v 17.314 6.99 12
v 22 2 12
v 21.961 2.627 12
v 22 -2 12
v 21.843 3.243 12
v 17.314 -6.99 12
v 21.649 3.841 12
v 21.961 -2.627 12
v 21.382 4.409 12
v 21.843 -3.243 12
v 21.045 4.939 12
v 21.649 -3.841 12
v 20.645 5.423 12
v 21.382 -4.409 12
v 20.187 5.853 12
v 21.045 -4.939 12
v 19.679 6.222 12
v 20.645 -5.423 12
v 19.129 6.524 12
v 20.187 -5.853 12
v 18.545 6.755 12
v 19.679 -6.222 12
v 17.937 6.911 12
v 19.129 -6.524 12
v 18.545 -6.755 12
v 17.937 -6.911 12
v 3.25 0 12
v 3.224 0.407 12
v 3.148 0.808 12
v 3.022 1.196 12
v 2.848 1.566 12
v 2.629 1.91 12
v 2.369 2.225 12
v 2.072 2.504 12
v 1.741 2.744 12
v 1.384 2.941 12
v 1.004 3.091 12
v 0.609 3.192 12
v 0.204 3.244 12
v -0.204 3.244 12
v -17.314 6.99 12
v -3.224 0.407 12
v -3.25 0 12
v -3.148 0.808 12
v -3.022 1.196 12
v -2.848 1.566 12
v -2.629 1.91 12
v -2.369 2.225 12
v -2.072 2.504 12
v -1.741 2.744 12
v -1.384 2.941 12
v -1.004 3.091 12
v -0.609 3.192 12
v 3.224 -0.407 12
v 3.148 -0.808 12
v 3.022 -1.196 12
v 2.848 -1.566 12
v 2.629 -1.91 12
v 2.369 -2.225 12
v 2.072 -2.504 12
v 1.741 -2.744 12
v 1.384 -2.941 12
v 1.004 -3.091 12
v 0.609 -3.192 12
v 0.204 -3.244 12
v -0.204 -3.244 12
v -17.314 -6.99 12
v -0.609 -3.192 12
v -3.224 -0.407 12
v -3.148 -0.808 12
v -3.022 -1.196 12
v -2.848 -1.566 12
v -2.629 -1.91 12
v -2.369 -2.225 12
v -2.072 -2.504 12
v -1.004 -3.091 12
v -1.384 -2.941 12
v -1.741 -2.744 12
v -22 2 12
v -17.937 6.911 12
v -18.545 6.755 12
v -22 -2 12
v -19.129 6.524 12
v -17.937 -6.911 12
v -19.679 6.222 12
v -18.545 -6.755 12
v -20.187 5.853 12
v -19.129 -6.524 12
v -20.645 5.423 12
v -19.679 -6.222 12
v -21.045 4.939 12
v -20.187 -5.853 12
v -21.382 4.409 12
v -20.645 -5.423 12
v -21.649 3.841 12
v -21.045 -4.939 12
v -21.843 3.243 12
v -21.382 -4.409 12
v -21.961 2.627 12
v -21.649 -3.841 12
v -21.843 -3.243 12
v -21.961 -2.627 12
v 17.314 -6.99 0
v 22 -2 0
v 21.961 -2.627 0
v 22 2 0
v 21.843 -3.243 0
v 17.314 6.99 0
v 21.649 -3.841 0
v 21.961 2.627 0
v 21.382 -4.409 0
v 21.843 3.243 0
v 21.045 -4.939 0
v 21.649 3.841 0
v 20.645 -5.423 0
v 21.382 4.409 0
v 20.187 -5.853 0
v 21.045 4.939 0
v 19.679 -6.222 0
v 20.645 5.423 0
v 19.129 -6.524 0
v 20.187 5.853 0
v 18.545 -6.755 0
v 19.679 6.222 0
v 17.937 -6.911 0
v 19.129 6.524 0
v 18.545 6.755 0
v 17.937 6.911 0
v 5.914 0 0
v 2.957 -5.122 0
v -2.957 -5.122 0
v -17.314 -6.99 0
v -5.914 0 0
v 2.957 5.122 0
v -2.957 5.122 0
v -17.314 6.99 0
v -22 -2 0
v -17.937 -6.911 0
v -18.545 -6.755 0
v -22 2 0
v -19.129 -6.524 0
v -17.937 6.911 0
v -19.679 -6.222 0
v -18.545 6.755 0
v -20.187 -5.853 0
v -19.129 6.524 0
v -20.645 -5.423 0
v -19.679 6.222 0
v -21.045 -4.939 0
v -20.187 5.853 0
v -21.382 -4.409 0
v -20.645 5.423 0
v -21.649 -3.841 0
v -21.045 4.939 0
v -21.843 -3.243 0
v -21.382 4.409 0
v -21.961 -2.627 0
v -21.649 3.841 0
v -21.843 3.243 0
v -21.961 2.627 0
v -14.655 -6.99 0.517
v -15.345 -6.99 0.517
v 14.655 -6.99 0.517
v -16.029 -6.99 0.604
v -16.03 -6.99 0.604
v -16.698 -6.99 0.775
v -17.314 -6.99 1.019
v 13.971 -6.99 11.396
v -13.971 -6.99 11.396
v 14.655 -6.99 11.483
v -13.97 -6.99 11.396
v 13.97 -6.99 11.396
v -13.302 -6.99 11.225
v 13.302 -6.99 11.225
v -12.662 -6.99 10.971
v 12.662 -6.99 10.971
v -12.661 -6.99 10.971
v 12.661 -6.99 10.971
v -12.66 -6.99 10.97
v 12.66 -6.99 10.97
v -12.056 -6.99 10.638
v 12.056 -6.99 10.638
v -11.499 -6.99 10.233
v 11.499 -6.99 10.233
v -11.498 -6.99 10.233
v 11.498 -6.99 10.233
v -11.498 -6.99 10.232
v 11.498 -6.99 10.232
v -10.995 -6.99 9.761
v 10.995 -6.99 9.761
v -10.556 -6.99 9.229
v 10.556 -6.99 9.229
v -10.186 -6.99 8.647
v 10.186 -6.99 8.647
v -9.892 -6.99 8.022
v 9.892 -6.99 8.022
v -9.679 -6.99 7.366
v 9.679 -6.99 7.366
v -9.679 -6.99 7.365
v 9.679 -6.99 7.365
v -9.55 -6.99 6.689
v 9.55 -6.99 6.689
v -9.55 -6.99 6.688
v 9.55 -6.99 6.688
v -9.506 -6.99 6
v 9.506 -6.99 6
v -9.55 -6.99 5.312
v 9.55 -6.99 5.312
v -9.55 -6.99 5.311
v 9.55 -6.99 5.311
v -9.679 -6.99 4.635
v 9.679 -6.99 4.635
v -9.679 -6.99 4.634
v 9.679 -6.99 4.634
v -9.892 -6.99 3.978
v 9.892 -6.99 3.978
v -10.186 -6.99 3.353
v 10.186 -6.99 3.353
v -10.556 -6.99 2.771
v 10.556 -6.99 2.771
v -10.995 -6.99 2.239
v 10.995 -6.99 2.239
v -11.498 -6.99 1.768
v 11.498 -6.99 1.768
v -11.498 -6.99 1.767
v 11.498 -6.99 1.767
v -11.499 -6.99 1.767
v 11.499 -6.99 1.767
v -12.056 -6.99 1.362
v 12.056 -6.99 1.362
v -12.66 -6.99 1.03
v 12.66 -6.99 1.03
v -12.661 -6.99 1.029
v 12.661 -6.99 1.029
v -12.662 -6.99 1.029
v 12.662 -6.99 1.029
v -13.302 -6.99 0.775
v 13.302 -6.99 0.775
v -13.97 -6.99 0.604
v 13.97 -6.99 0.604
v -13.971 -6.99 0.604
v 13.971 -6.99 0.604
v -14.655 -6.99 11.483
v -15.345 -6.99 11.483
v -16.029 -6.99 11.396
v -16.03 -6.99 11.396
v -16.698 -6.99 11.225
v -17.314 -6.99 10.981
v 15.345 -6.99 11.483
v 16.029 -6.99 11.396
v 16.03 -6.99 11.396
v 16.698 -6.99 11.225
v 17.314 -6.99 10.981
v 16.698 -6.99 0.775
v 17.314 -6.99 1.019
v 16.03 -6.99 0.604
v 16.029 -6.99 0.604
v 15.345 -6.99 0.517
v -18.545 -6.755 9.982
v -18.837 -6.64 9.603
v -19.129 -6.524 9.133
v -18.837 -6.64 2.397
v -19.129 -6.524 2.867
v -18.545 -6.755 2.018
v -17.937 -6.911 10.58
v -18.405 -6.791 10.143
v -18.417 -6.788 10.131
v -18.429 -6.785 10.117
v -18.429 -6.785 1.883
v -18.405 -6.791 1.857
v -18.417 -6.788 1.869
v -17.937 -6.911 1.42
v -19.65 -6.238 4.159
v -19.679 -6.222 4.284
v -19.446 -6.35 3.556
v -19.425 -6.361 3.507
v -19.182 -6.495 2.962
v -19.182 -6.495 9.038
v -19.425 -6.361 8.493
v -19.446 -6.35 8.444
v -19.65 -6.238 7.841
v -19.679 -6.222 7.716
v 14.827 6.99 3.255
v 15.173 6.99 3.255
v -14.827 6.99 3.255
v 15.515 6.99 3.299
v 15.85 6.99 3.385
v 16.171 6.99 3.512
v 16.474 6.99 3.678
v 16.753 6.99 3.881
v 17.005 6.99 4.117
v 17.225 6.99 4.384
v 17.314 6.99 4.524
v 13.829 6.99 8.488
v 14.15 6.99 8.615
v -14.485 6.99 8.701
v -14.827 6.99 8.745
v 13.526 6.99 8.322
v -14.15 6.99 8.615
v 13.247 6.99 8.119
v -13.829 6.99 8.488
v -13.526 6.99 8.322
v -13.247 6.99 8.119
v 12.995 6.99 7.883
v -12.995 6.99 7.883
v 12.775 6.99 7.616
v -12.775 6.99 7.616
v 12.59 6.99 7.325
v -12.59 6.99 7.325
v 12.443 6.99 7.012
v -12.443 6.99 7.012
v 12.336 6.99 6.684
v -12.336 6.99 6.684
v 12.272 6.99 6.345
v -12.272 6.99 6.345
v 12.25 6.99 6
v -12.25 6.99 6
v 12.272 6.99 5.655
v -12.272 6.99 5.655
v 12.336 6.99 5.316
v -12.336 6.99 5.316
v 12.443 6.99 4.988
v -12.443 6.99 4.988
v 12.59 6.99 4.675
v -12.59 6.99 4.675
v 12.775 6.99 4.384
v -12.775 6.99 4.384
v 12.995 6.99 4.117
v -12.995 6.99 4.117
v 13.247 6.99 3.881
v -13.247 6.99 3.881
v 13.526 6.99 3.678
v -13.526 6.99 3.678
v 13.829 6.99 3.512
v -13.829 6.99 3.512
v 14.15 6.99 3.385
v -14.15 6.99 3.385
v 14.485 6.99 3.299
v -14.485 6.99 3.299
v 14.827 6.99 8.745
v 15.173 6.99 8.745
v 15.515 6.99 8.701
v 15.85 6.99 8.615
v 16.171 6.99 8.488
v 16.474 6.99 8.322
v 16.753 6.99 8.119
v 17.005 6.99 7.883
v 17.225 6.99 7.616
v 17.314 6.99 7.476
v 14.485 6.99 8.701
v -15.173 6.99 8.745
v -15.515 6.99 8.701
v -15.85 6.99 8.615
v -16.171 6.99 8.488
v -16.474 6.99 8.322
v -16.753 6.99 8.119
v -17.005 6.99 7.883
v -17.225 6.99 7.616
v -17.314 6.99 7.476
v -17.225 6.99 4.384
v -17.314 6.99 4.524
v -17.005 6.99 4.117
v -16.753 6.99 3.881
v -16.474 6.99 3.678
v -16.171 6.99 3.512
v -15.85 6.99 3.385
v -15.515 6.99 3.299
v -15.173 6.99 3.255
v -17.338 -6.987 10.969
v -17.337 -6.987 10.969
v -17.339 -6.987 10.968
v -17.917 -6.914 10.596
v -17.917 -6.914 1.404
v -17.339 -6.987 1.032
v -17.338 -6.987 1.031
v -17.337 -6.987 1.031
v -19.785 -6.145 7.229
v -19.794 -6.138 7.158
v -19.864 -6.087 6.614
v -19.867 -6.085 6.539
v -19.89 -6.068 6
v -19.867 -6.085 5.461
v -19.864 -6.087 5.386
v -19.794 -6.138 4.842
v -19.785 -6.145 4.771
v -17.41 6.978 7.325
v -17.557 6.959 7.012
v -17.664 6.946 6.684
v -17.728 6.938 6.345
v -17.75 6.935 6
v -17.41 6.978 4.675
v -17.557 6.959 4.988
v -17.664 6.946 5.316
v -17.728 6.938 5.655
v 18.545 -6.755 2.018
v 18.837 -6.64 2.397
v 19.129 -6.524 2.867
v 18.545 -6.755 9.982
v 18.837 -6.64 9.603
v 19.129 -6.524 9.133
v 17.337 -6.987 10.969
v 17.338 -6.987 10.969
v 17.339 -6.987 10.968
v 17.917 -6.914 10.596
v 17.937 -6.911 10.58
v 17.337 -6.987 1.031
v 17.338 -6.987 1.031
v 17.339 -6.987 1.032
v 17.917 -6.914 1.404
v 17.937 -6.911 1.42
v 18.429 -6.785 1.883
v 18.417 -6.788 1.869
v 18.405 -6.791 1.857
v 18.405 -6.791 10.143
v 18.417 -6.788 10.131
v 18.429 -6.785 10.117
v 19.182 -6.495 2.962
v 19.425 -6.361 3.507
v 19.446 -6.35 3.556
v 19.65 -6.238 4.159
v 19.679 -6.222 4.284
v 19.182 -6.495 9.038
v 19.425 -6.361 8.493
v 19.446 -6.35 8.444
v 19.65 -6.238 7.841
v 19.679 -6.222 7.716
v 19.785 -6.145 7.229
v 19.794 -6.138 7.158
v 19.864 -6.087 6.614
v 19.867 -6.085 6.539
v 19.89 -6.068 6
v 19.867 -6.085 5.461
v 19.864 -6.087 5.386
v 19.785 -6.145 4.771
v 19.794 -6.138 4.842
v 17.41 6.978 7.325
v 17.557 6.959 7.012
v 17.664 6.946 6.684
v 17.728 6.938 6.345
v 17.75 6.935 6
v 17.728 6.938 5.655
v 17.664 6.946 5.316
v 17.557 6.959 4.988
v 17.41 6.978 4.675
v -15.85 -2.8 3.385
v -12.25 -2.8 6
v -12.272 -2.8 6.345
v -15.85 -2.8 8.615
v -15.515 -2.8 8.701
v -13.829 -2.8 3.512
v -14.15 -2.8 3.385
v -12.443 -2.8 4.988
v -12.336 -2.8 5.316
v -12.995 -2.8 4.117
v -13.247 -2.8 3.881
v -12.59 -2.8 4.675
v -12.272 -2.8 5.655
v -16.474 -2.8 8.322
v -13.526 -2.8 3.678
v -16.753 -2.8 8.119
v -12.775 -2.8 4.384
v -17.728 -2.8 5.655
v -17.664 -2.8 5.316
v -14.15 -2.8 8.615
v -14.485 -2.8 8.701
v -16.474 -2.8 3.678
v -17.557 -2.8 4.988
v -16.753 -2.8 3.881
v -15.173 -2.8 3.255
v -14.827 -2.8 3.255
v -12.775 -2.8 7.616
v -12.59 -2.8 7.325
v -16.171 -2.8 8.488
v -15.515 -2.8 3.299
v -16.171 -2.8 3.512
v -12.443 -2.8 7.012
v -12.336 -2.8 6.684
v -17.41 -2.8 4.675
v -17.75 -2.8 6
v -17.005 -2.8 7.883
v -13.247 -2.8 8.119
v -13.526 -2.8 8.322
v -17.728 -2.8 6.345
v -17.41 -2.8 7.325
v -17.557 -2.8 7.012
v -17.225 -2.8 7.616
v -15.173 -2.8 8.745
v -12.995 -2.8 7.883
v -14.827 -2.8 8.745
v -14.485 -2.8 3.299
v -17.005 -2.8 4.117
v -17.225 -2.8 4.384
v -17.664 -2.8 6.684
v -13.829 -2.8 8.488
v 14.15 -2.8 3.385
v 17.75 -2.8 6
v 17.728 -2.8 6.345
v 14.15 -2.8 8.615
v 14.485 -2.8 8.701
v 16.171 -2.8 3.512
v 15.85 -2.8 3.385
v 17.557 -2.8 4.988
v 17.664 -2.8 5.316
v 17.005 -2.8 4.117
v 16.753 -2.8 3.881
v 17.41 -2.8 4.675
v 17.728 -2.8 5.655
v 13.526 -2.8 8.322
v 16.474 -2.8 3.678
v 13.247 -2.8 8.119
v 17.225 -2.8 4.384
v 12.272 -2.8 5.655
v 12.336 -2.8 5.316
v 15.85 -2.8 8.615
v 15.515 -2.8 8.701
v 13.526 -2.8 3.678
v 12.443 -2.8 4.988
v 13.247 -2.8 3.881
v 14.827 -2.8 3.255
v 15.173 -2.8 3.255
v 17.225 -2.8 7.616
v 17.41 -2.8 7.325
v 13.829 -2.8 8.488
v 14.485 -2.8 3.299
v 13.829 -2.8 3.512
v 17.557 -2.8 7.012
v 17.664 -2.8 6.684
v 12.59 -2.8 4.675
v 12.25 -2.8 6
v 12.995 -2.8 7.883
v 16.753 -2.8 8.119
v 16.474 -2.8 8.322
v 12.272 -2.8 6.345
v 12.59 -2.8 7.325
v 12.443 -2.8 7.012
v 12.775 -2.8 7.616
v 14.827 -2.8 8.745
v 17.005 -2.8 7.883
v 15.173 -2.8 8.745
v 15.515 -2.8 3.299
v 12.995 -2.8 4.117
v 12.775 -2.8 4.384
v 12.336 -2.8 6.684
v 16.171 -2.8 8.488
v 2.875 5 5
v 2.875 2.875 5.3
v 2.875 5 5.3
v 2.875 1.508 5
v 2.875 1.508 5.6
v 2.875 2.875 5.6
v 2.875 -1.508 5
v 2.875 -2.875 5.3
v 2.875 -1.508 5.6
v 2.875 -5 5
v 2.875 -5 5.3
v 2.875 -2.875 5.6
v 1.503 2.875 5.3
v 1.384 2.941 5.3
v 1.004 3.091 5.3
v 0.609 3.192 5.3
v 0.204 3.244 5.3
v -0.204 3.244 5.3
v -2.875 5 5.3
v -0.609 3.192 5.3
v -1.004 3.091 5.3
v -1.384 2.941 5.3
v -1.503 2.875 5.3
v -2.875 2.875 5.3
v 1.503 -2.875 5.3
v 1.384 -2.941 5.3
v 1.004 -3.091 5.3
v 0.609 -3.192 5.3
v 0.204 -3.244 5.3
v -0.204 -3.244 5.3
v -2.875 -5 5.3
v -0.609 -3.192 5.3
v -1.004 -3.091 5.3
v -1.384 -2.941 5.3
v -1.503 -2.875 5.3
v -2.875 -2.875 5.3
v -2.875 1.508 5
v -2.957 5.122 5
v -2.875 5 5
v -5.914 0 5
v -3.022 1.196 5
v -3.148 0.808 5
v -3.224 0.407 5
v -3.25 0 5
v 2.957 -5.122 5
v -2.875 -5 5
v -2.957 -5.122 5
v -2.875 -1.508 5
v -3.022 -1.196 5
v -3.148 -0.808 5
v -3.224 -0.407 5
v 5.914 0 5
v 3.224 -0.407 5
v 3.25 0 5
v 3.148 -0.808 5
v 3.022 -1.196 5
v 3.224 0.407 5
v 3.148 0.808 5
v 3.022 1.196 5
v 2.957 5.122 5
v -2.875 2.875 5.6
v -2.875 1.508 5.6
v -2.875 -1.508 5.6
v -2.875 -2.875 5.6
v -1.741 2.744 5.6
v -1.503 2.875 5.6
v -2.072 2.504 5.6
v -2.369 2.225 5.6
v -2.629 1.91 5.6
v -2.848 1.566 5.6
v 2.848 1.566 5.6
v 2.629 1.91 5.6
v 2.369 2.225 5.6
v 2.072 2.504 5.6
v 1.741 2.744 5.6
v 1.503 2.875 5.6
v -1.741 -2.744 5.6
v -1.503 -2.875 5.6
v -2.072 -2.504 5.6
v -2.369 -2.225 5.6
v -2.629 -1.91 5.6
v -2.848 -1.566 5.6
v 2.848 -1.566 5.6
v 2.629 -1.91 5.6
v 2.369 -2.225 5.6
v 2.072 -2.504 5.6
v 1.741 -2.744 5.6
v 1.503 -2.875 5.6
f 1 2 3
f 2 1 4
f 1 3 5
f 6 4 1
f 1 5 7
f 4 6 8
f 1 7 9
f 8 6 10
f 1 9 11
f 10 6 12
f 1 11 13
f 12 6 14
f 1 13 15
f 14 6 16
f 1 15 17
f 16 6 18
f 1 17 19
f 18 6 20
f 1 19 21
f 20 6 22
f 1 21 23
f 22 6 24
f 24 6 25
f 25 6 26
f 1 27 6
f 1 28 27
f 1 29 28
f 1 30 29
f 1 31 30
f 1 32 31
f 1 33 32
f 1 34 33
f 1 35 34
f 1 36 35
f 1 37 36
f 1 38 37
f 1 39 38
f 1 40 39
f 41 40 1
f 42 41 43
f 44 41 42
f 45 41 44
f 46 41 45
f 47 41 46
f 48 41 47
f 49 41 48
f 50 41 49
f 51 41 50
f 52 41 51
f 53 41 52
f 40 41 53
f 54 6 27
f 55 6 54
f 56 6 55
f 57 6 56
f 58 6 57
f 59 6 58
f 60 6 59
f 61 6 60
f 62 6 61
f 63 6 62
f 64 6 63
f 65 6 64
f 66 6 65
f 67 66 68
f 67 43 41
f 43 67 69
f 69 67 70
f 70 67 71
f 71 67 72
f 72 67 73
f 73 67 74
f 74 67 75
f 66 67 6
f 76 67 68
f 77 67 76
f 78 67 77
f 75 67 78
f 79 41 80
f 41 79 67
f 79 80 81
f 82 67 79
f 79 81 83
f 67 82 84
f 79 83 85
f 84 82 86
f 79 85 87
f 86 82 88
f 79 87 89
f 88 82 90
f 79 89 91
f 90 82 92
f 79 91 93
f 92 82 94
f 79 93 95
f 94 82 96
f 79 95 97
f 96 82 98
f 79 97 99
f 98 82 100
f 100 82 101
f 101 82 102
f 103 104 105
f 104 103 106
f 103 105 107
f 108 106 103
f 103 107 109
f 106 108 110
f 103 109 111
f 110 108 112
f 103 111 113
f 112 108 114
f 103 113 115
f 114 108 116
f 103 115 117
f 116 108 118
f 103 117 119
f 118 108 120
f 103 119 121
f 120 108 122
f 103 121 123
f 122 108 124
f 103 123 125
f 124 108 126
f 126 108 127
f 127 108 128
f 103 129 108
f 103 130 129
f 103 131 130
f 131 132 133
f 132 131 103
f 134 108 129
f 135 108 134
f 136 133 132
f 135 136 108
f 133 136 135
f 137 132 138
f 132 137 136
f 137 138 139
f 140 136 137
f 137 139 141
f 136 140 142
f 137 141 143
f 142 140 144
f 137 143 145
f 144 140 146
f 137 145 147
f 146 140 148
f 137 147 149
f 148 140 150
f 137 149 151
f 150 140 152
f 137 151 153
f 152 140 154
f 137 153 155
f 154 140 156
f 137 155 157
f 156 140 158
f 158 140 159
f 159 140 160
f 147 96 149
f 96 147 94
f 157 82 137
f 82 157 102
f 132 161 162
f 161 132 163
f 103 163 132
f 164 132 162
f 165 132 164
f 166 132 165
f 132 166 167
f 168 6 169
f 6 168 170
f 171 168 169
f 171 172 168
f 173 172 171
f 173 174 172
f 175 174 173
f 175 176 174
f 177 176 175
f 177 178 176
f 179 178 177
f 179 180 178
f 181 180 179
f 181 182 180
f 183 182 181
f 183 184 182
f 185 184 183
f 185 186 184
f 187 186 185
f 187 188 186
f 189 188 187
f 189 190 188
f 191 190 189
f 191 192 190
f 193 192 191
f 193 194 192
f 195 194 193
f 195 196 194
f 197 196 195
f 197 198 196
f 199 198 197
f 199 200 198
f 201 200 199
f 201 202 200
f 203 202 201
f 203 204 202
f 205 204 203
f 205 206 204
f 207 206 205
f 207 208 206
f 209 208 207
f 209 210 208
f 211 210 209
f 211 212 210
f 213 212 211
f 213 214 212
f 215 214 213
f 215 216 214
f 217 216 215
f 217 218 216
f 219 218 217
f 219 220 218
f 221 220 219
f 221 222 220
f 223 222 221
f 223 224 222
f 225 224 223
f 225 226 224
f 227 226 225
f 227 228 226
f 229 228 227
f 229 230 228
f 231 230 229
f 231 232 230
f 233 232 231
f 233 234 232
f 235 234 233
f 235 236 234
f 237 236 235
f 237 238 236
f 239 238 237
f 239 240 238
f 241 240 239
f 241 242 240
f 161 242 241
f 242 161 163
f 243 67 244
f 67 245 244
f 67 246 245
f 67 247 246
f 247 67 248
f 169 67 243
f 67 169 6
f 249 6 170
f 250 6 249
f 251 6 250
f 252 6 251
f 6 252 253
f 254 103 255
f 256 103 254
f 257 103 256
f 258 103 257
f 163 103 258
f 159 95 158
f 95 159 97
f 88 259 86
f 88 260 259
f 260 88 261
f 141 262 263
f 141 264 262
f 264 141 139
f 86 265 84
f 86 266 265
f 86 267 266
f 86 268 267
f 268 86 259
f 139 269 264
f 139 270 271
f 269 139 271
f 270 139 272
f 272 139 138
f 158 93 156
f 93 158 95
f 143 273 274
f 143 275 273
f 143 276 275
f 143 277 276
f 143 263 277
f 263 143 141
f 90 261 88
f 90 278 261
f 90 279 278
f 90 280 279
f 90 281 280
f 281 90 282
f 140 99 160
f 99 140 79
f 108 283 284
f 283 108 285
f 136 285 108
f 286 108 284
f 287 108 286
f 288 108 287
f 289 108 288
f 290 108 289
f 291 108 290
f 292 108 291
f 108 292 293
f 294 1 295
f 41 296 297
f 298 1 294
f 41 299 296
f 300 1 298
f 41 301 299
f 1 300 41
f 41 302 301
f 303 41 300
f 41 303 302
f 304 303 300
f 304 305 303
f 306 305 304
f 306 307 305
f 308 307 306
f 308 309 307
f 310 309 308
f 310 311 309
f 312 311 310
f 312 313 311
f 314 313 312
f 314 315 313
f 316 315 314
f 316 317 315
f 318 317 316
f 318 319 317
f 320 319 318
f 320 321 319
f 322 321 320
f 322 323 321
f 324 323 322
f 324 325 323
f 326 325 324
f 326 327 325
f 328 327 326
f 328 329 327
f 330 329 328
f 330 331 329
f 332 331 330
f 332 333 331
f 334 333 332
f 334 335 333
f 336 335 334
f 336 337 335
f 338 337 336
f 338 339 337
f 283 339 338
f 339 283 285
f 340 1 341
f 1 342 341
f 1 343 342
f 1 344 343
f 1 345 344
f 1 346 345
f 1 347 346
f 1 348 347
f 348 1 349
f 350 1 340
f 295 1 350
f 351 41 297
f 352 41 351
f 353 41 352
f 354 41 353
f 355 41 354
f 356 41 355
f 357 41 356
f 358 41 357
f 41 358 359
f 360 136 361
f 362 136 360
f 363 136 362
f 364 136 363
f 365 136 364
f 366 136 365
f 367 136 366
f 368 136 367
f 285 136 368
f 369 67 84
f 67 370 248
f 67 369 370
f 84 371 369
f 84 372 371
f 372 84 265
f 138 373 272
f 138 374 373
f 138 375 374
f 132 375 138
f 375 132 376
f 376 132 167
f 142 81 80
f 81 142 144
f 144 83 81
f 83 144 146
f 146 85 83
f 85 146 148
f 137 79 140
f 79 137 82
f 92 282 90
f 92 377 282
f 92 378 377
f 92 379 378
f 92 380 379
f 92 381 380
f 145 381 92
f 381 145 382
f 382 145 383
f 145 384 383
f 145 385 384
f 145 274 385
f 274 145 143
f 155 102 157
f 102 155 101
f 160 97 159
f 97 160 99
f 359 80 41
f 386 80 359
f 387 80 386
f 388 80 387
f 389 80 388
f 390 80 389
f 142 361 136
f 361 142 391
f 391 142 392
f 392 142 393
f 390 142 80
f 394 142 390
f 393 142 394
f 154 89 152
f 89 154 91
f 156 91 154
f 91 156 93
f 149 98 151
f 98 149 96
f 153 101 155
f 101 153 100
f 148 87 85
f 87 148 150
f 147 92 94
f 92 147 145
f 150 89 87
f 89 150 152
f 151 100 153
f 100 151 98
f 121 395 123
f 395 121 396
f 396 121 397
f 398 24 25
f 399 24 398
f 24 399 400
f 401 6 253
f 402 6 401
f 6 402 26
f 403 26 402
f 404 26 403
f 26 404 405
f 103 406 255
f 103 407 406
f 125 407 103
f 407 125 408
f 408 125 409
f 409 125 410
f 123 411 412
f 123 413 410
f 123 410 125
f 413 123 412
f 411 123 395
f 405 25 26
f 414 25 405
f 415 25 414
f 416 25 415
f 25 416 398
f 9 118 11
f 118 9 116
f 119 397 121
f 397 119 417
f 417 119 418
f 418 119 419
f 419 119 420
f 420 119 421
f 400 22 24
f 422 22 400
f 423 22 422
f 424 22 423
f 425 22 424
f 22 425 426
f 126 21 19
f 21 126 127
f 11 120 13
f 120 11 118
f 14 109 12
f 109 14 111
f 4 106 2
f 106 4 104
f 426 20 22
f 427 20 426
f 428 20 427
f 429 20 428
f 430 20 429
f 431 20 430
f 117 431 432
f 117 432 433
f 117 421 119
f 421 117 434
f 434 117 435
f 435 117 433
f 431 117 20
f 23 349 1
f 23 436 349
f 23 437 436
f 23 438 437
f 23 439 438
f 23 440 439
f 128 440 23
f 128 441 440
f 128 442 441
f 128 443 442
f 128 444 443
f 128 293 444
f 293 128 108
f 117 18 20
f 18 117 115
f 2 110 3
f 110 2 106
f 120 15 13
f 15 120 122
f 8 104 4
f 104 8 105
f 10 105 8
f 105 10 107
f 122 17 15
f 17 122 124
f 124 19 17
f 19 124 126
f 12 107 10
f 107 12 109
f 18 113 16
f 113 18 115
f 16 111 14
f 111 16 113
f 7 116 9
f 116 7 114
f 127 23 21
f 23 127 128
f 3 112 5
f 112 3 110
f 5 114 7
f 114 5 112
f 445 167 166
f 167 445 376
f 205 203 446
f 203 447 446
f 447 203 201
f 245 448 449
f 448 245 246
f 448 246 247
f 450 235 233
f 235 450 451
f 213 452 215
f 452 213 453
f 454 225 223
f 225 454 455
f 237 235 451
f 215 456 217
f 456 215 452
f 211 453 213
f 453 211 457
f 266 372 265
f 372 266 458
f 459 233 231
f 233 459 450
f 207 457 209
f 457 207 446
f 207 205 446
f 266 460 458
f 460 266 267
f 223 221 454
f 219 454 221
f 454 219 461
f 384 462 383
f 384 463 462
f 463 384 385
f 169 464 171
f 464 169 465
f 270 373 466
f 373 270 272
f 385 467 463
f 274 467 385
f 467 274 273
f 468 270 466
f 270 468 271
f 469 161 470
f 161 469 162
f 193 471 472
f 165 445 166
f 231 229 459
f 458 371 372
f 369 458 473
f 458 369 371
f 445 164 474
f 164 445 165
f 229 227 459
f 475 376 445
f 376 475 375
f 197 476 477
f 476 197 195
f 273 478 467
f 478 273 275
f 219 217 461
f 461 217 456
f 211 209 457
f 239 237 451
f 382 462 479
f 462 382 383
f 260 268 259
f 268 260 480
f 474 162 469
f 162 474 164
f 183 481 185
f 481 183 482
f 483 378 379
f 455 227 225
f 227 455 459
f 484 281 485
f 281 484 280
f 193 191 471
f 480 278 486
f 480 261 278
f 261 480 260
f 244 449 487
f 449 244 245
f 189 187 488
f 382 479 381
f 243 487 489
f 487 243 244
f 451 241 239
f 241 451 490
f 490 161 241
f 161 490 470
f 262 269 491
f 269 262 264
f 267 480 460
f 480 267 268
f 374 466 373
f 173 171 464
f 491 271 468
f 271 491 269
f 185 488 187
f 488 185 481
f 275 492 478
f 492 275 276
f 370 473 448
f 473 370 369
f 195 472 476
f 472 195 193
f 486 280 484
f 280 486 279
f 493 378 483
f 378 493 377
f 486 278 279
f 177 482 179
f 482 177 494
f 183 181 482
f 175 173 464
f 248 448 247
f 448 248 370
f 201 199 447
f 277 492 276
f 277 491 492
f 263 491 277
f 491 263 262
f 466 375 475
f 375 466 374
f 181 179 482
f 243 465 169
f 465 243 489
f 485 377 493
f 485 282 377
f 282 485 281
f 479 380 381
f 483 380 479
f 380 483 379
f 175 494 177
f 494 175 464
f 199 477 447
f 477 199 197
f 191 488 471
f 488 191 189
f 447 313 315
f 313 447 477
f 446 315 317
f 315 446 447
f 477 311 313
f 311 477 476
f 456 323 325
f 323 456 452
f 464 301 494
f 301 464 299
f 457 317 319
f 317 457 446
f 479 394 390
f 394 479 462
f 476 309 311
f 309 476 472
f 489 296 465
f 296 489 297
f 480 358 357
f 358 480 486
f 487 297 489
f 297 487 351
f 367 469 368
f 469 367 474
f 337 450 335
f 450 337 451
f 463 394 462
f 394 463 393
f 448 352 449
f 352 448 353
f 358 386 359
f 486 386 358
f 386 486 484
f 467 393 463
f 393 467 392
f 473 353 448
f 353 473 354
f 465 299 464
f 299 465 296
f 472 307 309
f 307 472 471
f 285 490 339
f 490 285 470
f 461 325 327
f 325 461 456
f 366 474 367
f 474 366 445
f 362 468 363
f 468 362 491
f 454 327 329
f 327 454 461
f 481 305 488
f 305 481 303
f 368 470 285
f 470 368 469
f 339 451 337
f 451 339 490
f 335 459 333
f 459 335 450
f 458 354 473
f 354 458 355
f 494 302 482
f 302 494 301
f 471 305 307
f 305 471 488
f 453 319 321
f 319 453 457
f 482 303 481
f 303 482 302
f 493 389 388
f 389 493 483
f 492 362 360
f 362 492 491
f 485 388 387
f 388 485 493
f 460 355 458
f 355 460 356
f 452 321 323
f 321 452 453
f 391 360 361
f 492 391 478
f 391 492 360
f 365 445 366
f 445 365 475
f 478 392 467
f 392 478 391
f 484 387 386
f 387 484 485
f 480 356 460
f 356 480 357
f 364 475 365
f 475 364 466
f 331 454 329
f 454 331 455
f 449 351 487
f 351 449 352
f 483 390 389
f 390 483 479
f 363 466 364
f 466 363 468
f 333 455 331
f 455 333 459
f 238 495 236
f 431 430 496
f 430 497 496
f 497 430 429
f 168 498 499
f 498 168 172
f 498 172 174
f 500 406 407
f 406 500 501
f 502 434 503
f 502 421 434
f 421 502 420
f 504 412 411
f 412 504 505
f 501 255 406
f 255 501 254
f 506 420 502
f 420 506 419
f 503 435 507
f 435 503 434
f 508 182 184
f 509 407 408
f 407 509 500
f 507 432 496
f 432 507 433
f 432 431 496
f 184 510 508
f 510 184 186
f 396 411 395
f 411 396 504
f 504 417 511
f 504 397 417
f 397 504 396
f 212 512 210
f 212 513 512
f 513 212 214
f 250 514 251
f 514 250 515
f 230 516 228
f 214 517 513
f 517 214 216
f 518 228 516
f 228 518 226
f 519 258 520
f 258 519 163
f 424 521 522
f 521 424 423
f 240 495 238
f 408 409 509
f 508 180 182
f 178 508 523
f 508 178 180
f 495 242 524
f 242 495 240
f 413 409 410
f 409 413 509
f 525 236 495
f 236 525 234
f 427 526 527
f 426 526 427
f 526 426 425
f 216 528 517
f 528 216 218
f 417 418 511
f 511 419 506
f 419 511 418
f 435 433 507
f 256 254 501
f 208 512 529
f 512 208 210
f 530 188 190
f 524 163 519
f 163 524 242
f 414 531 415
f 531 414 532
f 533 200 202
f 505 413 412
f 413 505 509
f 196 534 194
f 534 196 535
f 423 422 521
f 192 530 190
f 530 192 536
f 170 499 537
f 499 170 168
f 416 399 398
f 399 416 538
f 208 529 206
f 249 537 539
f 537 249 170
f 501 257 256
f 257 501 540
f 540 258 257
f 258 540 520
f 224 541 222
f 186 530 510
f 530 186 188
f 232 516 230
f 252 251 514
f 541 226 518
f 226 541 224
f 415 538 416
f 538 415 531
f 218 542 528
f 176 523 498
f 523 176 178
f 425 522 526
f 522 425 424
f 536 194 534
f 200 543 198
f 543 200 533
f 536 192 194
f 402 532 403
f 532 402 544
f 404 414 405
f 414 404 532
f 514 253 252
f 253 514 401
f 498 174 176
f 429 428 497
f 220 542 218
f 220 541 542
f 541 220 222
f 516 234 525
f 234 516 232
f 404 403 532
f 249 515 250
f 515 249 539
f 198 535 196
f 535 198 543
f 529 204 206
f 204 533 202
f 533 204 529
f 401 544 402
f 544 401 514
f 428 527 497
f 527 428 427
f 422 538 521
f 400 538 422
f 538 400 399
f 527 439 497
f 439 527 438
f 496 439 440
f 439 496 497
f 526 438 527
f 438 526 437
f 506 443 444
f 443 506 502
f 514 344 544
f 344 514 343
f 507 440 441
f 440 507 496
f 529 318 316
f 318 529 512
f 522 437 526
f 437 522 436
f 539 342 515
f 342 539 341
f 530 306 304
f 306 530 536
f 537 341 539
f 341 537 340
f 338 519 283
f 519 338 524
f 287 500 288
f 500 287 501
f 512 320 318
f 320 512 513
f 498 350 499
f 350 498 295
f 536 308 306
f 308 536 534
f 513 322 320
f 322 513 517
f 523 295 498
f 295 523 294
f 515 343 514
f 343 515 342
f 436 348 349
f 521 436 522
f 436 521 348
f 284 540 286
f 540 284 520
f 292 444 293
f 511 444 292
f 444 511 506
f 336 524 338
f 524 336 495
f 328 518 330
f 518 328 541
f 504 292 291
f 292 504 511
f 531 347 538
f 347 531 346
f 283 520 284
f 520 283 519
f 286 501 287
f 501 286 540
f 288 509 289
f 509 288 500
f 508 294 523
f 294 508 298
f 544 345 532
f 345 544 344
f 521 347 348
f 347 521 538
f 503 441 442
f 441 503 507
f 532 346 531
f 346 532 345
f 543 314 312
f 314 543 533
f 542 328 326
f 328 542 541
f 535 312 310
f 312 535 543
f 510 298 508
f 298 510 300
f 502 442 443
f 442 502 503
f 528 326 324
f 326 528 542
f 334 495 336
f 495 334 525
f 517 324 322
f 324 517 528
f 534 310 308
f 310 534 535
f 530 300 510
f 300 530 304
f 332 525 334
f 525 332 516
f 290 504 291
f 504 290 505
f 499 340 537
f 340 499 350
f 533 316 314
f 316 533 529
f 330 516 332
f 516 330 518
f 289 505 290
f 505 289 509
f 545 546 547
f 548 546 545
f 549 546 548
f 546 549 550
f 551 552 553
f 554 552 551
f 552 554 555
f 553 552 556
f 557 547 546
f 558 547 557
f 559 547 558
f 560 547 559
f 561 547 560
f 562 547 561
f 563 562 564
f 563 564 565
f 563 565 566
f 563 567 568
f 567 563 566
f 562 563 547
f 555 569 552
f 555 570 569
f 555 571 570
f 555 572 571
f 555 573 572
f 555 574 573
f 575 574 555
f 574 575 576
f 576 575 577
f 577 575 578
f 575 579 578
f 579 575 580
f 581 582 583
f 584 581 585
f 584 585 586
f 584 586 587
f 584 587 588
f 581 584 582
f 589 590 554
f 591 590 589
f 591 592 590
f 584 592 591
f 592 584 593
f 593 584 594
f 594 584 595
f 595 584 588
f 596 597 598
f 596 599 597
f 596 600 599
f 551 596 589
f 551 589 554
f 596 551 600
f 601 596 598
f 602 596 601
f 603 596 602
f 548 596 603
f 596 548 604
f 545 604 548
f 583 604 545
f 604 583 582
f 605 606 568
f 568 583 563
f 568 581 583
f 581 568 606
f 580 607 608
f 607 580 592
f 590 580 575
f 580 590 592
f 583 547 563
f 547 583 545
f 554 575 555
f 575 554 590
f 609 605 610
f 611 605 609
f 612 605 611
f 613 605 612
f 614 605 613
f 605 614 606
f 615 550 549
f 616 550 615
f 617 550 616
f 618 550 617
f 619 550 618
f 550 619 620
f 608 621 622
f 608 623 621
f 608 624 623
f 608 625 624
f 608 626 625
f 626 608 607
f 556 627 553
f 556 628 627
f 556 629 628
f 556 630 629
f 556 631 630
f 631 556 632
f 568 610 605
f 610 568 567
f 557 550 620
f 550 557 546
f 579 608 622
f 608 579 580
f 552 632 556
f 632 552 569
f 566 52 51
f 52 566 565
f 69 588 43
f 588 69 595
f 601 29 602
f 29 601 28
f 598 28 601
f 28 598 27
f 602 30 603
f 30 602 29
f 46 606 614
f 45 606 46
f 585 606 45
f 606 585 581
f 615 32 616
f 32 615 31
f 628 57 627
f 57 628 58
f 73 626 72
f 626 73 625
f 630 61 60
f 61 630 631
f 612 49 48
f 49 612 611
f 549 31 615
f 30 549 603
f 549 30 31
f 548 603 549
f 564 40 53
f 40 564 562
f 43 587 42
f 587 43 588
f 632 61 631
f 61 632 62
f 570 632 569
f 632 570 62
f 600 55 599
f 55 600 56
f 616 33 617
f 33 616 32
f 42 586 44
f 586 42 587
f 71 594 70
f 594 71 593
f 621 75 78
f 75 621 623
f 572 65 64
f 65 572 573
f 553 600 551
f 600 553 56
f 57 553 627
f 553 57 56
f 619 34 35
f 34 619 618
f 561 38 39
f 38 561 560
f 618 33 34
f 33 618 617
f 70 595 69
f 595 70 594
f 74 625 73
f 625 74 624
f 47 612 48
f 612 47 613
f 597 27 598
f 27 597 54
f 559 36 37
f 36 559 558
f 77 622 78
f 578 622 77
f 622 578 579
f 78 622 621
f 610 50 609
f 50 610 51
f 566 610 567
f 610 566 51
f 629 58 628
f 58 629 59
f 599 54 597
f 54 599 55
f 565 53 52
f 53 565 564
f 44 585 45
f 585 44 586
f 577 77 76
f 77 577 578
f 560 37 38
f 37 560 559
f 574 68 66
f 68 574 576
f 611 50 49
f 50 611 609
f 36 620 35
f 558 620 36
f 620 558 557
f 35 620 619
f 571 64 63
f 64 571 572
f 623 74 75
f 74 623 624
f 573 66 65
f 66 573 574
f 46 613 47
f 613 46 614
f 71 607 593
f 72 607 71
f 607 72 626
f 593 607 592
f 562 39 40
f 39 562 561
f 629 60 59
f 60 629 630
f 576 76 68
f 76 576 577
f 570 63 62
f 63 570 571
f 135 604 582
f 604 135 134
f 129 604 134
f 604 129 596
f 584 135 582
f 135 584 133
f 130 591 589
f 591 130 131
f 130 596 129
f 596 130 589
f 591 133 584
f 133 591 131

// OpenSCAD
$fn = 50;


difference() {
	union() {
		cylinder(h = 12, r = 7.0000000000);
		translate(v = [-7.5000000000, 0.0000000000, 0]) {
			hull() {
				translate(v = [-9.5000000000, 2.0000000000, 0]) {
					cylinder(h = 12, r = 5);
				}
				translate(v = [9.5000000000, 2.0000000000, 0]) {
					cylinder(h = 12, r = 5);
				}
				translate(v = [-9.5000000000, -2.0000000000, 0]) {
					cylinder(h = 12, r = 5);
				}
				translate(v = [9.5000000000, -2.0000000000, 0]) {
					cylinder(h = 12, r = 5);
				}
			}
		}
		translate(v = [7.5000000000, 0.0000000000, 0]) {
			hull() {
				translate(v = [-9.5000000000, 2.0000000000, 0]) {
					cylinder(h = 12, r = 5);
				}
				translate(v = [9.5000000000, 2.0000000000, 0]) {
					cylinder(h = 12, r = 5);
				}
				translate(v = [-9.5000000000, -2.0000000000, 0]) {
					cylinder(h = 12, r = 5);
				}
				translate(v = [9.5000000000, -2.0000000000, 0]) {
					cylinder(h = 12, r = 5);
				}
			}
		}
	}
	union() {
		translate(v = [-15.0000000000, -7.0000000000, 6.0000000000]) {
			rotate(a = [90, 0, 0]) {
				difference() {
					union() {
						#translate(v = [0, 0, -14.0000000000]) {
							cylinder(h = 14, r = 2.2500000000);
						}
						#translate(v = [0, 0, -4.2000000000]) {
							cylinder(h = 4.2000000000, r1 = 2.7500000000, r2 = 5.5000000000);
						}
						#translate(v = [0, 0, -14.0000000000]) {
							cylinder(h = 14, r = 2.7500000000);
						}
						#translate(v = [0, 0, -14.0000000000]) {
							cylinder(h = 14, r = 2.2500000000);
						}
					}
					union();
				}
			}
		}
		translate(v = [15.0000000000, -7.0000000000, 6.0000000000]) {
			rotate(a = [90, 0, 0]) {
				difference() {
					union() {
						#translate(v = [0, 0, -14.0000000000]) {
							cylinder(h = 14, r = 2.2500000000);
						}
						#translate(v = [0, 0, -4.2000000000]) {
							cylinder(h = 4.2000000000, r1 = 2.7500000000, r2 = 5.5000000000);
						}
						#translate(v = [0, 0, -14.0000000000]) {
							cylinder(h = 14, r = 2.7500000000);
						}
						#translate(v = [0, 0, -14.0000000000]) {
							cylinder(h = 14, r = 2.2500000000);
						}
					}
					union();
				}
			}
		}
		translate(v = [0.0000000000, 0.0000000000, 0]) {
			rotate(a = [0, 0, 0]) {
				difference() {
					union() {
						#translate(v = [-2.8750000000, -5.0000000000, -0.3000000000]) {
							cube(size = [5.7500000000, 10, 0.3000000000]);
						}
						#translate(v = [-2.8750000000, -2.8750000000, -0.6000000000]) {
							cube(size = [5.7500000000, 5.7500000000, 0.3000000000]);
						}
						#translate(v = [-2.8750000000, -5.0000000000, 5]) {
							cube(size = [5.7500000000, 10, 0.3000000000]);
						}
						#translate(v = [-2.8750000000, -2.8750000000, 5.3000000000]) {
							cube(size = [5.7500000000, 5.7500000000, 0.3000000000]);
						}
						#translate(v = [0, 0, -100.0000000000]) {
							cylinder(h = 200, r = 3.2500000000);
						}
						#linear_extrude(height = 5) {
							polygon(points = [[5.9142500000, 0.0000000000], [2.9571250000, 5.1218907443], [-2.9571250000, 5.1218907443], [-5.9142500000, 0.0000000000], [-2.9571250000, -5.1218907443], [2.9571250000, -5.1218907443]]);
						}
						#translate(v = [-2.8750000000, -5.0000000000, -0.3000000000]) {
							cube(size = [5.7500000000, 10, 0.3000000000]);
						}
						#translate(v = [-2.8750000000, -2.8750000000, -0.6000000000]) {
							cube(size = [5.7500000000, 5.7500000000, 0.3000000000]);
						}
						#translate(v = [-2.8750000000, -5.0000000000, 5]) {
							cube(size = [5.7500000000, 10, 0.3000000000]);
						}
						#translate(v = [-2.8750000000, -2.8750000000, 5.3000000000]) {
							cube(size = [5.7500000000, 5.7500000000, 0.3000000000]);
						}
						#translate(v = [0, 0, -100.0000000000]) {
							cylinder(h = 200, r = 3.2500000000);
						}
						#translate(v = [-2.8750000000, -5.0000000000, -0.3000000000]) {
							cube(size = [5.7500000000, 10, 0.3000000000]);
						}
						#translate(v = [-2.8750000000, -2.8750000000, -0.6000000000]) {
							cube(size = [5.7500000000, 5.7500000000, 0.3000000000]);
						}
						#translate(v = [-2.8750000000, -5.0000000000, 5]) {
							cube(size = [5.7500000000, 10, 0.3000000000]);
						}
						#translate(v = [-2.8750000000, -2.8750000000, 5.3000000000]) {
							cube(size = [5.7500000000, 5.7500000000, 0.3000000000]);
						}
						#translate(v = [0, 0, -100.0000000000]) {
							cylinder(h = 200, r = 3.2500000000);
						}
					}
					union();
				}
			}
		}
		translate(v = [0, 0, -100]) {
			cylinder(h = 200, r = 3.2500000000);
		}
		translate(v = [0, 0, -100]) {
			cylinder(h = 200, r = 1.8000000000);
		}
	}
}
